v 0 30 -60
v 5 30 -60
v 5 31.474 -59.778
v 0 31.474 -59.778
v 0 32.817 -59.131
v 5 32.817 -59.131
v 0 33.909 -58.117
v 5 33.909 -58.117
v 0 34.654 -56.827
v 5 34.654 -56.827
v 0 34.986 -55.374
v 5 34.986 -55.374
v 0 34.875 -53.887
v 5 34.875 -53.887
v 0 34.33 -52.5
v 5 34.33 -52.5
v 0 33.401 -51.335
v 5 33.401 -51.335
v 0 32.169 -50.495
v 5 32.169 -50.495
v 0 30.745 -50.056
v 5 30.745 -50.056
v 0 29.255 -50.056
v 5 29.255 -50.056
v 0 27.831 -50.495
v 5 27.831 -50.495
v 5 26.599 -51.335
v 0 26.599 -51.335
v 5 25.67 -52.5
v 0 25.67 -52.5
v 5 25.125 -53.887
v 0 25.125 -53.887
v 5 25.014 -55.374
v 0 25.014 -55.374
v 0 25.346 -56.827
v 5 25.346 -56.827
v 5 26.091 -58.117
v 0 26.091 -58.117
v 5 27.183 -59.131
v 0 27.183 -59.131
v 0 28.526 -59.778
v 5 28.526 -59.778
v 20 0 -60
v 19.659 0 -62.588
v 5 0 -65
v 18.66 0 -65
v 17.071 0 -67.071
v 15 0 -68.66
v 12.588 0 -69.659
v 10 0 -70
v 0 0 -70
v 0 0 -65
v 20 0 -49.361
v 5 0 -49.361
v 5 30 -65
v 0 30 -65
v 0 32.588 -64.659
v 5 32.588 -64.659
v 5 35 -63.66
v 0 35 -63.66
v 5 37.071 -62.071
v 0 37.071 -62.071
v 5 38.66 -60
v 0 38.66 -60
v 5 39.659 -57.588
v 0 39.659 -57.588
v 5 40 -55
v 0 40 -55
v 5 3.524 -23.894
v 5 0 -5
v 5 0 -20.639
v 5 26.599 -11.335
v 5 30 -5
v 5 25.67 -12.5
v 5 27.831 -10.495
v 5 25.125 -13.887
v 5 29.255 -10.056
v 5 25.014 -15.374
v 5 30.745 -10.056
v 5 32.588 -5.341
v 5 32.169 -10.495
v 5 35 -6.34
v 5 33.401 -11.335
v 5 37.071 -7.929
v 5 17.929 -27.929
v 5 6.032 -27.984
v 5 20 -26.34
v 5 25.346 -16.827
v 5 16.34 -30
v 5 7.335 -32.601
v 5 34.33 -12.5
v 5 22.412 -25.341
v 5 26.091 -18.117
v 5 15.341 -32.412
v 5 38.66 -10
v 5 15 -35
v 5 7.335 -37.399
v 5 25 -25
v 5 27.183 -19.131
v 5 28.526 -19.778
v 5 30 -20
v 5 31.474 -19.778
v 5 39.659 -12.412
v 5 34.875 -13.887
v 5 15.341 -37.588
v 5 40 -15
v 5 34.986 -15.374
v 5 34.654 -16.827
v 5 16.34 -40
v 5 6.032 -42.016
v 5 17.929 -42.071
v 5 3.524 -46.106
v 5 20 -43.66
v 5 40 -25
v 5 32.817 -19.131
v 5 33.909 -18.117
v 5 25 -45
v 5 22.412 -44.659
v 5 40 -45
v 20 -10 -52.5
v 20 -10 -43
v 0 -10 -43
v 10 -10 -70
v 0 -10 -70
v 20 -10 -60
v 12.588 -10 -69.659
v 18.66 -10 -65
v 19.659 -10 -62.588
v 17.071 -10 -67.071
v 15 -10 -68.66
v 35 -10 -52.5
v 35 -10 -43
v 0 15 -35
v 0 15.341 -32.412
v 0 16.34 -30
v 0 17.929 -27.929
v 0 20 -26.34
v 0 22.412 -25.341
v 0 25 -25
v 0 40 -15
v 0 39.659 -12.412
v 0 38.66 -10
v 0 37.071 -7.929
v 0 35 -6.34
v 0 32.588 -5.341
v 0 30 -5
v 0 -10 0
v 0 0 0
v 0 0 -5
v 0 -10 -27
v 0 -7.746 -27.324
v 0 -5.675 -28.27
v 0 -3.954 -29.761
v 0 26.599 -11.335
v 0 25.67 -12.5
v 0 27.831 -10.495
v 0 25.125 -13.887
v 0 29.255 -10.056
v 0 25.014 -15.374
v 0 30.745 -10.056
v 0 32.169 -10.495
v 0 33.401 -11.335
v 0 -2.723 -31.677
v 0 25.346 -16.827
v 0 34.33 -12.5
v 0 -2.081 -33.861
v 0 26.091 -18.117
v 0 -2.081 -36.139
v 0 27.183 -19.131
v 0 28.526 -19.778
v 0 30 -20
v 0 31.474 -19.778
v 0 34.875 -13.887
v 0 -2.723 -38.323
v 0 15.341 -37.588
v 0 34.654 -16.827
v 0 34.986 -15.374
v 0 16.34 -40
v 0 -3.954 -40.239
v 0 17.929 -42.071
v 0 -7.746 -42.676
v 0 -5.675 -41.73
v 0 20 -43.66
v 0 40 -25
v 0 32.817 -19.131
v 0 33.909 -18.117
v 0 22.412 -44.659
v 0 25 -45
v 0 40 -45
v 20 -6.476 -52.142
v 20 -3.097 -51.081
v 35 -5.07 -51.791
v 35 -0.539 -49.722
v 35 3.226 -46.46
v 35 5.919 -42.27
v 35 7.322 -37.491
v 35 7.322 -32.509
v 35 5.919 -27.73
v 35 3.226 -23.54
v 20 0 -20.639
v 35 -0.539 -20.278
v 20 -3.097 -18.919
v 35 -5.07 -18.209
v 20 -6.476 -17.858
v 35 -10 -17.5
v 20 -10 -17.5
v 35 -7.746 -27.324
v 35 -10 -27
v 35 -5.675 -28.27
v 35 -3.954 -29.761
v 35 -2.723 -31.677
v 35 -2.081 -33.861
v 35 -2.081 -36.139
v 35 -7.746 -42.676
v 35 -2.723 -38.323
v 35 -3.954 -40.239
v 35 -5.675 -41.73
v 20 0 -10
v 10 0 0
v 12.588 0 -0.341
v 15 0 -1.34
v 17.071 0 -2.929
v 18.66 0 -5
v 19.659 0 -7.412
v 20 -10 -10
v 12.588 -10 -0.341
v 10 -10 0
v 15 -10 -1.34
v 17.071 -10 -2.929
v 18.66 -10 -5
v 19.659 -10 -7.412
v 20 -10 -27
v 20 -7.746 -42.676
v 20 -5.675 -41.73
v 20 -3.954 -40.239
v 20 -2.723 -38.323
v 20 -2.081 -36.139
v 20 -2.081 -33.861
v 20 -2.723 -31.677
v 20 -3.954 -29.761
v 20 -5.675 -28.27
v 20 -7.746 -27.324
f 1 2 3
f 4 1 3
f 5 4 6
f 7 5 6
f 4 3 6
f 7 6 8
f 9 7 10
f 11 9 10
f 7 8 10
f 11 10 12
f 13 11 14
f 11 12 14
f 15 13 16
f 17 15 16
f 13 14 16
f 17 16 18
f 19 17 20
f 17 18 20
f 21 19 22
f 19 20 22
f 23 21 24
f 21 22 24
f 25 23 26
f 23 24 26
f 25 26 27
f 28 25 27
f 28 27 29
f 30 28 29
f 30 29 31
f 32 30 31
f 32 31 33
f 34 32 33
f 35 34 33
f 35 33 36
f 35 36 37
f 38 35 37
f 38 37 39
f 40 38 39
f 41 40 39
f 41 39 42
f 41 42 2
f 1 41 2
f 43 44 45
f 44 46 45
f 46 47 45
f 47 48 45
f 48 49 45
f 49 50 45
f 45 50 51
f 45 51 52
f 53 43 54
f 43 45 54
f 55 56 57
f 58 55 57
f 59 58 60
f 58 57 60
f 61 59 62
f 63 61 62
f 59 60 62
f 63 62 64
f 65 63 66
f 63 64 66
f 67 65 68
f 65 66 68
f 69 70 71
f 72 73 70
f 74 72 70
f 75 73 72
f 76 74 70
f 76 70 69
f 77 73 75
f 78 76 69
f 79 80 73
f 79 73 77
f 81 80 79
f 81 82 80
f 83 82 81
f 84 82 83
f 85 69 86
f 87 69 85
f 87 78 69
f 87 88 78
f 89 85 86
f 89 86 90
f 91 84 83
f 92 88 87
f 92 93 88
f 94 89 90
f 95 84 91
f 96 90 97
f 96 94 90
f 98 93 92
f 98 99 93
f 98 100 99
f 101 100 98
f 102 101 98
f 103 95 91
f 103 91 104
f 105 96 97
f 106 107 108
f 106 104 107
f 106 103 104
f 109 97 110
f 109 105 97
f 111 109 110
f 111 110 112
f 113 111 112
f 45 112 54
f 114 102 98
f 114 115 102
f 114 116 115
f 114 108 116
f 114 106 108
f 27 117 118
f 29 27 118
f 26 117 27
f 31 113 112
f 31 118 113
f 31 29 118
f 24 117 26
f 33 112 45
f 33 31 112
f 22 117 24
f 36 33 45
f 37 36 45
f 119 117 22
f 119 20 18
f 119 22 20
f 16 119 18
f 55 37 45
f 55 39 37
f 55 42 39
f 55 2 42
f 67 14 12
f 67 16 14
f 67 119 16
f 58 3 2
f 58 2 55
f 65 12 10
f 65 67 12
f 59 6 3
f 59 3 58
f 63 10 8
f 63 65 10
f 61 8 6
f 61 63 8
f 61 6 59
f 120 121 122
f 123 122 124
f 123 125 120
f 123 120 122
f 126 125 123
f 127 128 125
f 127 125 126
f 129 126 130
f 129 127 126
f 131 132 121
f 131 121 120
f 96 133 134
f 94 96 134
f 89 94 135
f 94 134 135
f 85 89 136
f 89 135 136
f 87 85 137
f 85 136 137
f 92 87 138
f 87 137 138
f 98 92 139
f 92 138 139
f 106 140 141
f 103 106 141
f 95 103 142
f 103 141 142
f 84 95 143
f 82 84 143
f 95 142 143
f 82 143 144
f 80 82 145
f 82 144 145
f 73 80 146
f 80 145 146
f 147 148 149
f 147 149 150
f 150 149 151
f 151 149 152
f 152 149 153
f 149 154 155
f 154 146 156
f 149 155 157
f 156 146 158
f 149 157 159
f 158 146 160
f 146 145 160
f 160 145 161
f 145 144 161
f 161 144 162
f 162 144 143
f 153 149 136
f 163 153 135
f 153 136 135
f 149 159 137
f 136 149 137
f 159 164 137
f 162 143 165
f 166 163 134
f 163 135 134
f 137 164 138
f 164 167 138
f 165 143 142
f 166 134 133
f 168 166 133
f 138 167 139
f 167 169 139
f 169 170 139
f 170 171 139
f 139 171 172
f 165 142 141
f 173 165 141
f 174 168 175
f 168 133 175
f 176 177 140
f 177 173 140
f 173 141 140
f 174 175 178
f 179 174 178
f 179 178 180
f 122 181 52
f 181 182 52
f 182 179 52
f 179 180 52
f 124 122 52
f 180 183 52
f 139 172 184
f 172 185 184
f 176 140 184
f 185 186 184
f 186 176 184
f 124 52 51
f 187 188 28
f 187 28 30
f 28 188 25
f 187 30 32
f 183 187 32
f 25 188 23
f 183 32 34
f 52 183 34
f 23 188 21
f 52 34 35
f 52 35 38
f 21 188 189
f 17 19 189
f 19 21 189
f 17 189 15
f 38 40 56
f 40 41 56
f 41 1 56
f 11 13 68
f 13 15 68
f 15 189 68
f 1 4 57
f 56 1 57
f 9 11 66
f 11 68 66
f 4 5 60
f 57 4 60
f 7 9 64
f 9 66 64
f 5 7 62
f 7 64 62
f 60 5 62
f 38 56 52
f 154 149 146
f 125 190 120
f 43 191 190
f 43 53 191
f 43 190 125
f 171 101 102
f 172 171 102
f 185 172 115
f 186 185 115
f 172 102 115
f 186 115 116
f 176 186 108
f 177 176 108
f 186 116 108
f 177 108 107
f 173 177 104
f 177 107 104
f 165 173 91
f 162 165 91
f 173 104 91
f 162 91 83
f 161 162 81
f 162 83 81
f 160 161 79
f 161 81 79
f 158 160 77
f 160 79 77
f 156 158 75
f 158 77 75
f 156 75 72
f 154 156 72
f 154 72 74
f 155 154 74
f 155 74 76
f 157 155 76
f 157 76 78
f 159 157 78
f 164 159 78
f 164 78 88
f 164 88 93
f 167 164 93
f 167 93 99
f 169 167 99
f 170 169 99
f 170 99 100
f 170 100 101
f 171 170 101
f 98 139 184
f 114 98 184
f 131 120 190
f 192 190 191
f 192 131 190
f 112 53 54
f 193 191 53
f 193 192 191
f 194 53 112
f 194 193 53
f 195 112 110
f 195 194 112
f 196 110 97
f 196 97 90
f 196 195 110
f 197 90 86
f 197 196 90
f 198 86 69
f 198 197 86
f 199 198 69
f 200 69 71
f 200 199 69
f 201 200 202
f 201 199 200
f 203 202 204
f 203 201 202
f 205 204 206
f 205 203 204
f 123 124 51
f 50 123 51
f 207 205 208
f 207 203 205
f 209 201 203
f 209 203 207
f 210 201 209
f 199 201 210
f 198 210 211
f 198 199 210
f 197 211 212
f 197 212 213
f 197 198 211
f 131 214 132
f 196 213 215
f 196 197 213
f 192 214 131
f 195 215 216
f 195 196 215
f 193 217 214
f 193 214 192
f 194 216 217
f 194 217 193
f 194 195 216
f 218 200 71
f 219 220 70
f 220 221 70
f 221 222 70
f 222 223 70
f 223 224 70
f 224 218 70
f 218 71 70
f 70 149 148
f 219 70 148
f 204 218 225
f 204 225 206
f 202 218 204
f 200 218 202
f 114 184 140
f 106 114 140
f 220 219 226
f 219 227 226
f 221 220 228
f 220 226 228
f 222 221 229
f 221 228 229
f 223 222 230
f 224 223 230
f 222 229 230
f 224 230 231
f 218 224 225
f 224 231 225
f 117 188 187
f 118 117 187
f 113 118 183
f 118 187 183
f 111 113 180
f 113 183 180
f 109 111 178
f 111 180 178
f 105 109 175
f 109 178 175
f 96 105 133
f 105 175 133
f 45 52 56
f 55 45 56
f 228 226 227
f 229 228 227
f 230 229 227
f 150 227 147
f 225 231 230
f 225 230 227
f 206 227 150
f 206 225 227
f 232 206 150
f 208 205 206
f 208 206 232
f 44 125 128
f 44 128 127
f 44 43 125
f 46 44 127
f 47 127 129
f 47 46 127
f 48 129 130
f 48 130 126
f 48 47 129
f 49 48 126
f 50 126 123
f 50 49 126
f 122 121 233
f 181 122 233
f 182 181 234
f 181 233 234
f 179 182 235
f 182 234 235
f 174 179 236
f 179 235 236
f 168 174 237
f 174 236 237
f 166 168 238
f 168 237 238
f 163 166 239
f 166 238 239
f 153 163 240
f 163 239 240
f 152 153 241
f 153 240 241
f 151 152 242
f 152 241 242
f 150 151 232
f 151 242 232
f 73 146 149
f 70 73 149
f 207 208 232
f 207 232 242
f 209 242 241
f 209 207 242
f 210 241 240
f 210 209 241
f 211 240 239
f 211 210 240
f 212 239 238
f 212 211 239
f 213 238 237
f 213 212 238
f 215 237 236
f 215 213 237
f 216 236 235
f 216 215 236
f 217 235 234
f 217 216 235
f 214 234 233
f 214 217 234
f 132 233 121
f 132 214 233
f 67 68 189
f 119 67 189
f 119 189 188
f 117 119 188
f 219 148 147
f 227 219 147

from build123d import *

# Parameters (mm, degrees)
EXTRUDE_1_DEPTH     = 20
EXTRUDE_2_DEPTH     = 5
FILLET_1_R          = 10
SKETCH_2_R          = 5
CUT_EXTRUDE_1_DEPTH = 83.006097334
EXTRUDE_5_REACH     = 120.066
EXTRUDE_START       = 35
SKETCH_5_R          = 8
CUT_EXTRUDE_2_DEPTH = 84.066238629


with BuildPart() as part:
    # 草圖1 → 填料-伸長1 (new body)
    with BuildSketch(Plane(origin=(0, 0, 0), x_dir=(0, 0, -1), z_dir=(1, 0, 0))):
        Polygon((5, 0), (0, 0), (0, -10), (35, -10), (35, 0), align=None)
        Polygon((65, 0), (35, 0), (35, -10), (70, -10), (70, 0), align=None)
    extrude(amount=EXTRUDE_1_DEPTH)

    # 草圖1<3> → 填料-伸長2 (add)
    with BuildSketch(Plane(origin=(0, 0, 0), x_dir=(0, 0, -1), z_dir=(1, 0, 0))):
        with BuildLine():
            Line((5, 30), (5, 0))
            Line((5, 0), (35, 0))
            Line((35, 0), (35, 15))
            ThreePointArc((35, 15), (27.928932188, 17.928932188), (25, 25))
            Line((25, 25), (25, 40))
            Line((25, 40), (15, 40))
            ThreePointArc((15, 40), (7.928932188, 37.071067812), (5, 30))
        make_face()
        with BuildLine():
            Line((35, 15), (35, 0))
            Line((35, 0), (65, 0))
            Line((65, 0), (65, 30))
            ThreePointArc((65, 30), (62.071067812, 37.071067812), (55, 40))
            Line((55, 40), (45, 40))
            Line((45, 40), (45, 25))
            ThreePointArc((45, 25), (42.071067812, 17.928932188), (35, 15))
        make_face()
    extrude(amount=EXTRUDE_2_DEPTH)

    # 圓角1
    fillet_1_edges = [part.edges().sort_by_distance(p)[0] for p in [
        (20, -5, 0),
        (20, -5, -70),
    ]]
    fillet(fillet_1_edges, radius=FILLET_1_R)

    # 草圖2 → 除料-伸長1 (cut, through all)
    with BuildSketch(Plane(origin=(5, 0, 0), x_dir=(0, 0, -1), z_dir=(1, 0, 0))):
        with Locations((15, 30)):
            Circle(SKETCH_2_R)
        with Locations((55, 30)):
            Circle(SKETCH_2_R)
    extrude(amount=-CUT_EXTRUDE_1_DEPTH, mode=Mode.SUBTRACT)

    # 填料-伸長5: up to this face of the body (flat: up to its plane)
    extrude_5_end = Plane(part.part.faces().sort_by_distance((5, 32.5, -24.278889745))[0])
    # 草圖3 → 填料-伸長5 (add, up to the picked face)
    with BuildSketch(Plane(origin=(0, 0, 0), x_dir=(0, 0, -1), z_dir=(1, 0, 0)).offset(EXTRUDE_START), mode=Mode.PRIVATE) as extrude_5_sk1:
        with BuildLine():
            Line((17.5, -10), (27, -10))
            ThreePointArc((27, -10), (35, -2), (43, -10))
            Line((43, -10), (52.5, -10))
            ThreePointArc((52.5, -10), (35, 7.5), (17.5, -10))
        make_face()
    extrude_5_tool1 = split(extrude(extrude_5_sk1.sketch, amount=-EXTRUDE_5_REACH, mode=Mode.PRIVATE), bisect_by=extrude_5_end, keep=Keep.BOTH, mode=Mode.PRIVATE)
    add(extrude_5_tool1.solids().sort_by(Axis((35, -1.507575, -35), (-1, 0, 0)))[0])

    # 草圖5 → 除料-伸長2 (cut, through all)
    with BuildSketch(Plane(origin=(20, 0, 0), x_dir=(0, 0, -1), z_dir=(1, 0, 0))):
        with Locations((35, -10)):
            Circle(SKETCH_5_R)
    extrude(amount=-CUT_EXTRUDE_2_DEPTH, mode=Mode.SUBTRACT)


solid = part.part
